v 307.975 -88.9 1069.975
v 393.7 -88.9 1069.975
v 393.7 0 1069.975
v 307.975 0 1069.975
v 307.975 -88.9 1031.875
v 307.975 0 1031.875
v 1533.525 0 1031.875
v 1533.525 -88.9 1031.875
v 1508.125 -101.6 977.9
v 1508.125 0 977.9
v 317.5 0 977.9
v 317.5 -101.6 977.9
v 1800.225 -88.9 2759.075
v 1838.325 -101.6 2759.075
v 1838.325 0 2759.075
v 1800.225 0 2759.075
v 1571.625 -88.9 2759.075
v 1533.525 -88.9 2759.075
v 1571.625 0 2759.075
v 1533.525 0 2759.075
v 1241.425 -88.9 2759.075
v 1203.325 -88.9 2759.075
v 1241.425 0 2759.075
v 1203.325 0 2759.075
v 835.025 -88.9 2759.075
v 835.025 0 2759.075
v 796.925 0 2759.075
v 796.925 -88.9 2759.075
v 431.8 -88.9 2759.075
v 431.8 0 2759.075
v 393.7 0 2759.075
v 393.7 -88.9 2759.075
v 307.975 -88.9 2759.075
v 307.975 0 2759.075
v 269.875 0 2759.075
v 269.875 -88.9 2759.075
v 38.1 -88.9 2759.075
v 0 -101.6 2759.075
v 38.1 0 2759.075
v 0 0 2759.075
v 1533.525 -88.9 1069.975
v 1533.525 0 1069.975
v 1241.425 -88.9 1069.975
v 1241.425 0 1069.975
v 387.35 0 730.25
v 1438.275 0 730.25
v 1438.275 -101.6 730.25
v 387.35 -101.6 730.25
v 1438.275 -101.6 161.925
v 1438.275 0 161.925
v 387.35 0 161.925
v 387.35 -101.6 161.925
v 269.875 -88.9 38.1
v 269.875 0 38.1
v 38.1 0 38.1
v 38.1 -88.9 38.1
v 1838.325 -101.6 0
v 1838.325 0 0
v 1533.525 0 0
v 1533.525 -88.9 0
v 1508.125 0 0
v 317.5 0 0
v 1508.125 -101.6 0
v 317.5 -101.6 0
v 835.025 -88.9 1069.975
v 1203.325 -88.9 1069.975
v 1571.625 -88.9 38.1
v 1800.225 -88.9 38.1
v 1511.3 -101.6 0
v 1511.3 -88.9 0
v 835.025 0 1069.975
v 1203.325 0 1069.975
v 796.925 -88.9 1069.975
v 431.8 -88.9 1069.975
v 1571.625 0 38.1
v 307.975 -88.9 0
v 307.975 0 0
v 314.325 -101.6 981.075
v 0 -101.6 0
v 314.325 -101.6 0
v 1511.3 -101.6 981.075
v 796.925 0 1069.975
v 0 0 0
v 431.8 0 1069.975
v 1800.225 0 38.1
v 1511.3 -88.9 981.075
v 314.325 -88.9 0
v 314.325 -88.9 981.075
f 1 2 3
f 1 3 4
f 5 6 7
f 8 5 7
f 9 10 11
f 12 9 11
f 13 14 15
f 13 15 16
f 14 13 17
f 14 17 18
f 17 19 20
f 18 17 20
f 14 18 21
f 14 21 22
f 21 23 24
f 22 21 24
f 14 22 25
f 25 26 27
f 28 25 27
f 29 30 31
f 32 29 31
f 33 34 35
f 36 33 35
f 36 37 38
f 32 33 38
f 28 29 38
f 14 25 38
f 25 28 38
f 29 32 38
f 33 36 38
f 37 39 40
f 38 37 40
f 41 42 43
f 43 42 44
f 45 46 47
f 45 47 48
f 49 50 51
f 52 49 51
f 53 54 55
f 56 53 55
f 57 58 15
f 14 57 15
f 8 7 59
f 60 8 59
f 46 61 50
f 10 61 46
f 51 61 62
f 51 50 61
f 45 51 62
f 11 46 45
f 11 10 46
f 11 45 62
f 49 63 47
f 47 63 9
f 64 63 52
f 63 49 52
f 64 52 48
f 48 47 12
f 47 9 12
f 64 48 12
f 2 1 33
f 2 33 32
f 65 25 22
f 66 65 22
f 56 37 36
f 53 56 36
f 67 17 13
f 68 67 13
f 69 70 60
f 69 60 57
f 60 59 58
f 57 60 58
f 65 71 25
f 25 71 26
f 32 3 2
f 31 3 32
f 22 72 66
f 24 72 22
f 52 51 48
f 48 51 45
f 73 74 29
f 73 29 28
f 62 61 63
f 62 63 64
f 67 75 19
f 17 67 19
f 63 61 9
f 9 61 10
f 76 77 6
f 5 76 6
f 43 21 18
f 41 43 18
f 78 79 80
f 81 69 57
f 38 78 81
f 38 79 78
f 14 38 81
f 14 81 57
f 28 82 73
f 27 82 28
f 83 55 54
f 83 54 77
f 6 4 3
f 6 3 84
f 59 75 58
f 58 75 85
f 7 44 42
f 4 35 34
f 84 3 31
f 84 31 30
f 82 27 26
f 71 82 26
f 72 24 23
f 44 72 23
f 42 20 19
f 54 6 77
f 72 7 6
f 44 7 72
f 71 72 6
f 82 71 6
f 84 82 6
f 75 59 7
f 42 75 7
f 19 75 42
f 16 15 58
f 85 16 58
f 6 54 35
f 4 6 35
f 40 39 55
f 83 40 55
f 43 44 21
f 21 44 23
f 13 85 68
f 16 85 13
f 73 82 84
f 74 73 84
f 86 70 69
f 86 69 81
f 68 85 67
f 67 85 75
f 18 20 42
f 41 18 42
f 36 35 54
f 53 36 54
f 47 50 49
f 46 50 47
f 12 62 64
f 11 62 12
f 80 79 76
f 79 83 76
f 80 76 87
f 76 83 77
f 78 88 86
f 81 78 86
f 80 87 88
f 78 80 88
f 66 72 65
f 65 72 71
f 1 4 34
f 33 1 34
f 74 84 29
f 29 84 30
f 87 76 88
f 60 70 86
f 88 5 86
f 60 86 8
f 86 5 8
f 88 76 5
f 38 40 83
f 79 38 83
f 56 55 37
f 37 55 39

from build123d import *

# Parameters (mm, degrees)
F0_W     = 38.1
F0_H     = 2720.975
F0_H_2   = 1689.1
F1_DEPTH = 88.9
F2_W     = 1190.625
F2_H     = 977.9
F2_W_2   = 1050.925
F2_H_2   = 568.325
F3_DEPTH = 101.6
F4_W     = 412.75
F4_H     = 914.4
F4_W_2   = 1425.575
F4_W_3   = 314.325
F4_H_2   = 981.075
F4_W_4   = 327.025
F5_DEPTH = 12.7


with BuildPart() as f1:
    # F0 (on Front) → F1 (new body)
    with BuildSketch(Plane.XZ):
        with Locations((19.05, 1398.5875)):
            Rectangle(F0_W, F0_H)
        Polygon((38.1, 38.1), (0, 38.1), (0, 0), (307.975, 0), (307.975, 38.1), (269.875, 38.1), align=None)
        Polygon((269.875, 2759.075), (269.875, 38.1), (307.975, 38.1), (307.975, 1031.875), (307.975, 1069.975), (307.975, 2759.075), align=None)
        Polygon((307.975, 1069.975), (307.975, 1031.875), (1533.525, 1031.875), (1533.525, 1069.975), (1241.425, 1069.975), (1203.325, 1069.975), (835.025, 1069.975), (796.925, 1069.975), (431.8, 1069.975), (393.7, 1069.975), align=None)
        Polygon((1533.525, 1069.975), (1533.525, 1031.875), (1533.525, 38.1), (1571.625, 38.1), (1571.625, 2759.075), (1533.525, 2759.075), align=None)
        Polygon((1571.625, 38.1), (1533.525, 38.1), (1533.525, 0), (1838.325, 0), (1838.325, 38.1), (1800.225, 38.1), align=None)
        with Locations((412.75, 1914.525)):
            Rectangle(F0_W, F0_H_2)
        with Locations((1222.375, 1914.525)):
            Rectangle(F0_W, F0_H_2)
        with Locations((1819.275, 1398.5875)):
            Rectangle(F0_W, F0_H)
        with Locations((815.975, 1914.525)):
            Rectangle(F0_W, F0_H_2)
    extrude(amount=F1_DEPTH)

    # F4 (on face) → F5 (join)
    with BuildSketch(Plane.XZ.offset(88.9)):
        with Locations((206.375, 2301.875)):
            Rectangle(F4_W, F4_H)
        with Locations((1125.5375, 2301.875)):
            Rectangle(F4_W_2, F4_H)
        Polygon((412.75, 1844.675), (0, 1844.675), (0, 981.075), (314.325, 981.075), (412.75, 981.075), align=None)
        Polygon((1838.325, 1844.675), (412.75, 1844.675), (412.75, 981.075), (1511.3, 981.075), (1838.325, 981.075), align=None)
        with Locations((157.1625, 490.5375)):
            Rectangle(F4_W_3, F4_H_2)
        with Locations((1674.8125, 490.5375)):
            Rectangle(F4_W_4, F4_H_2)
    extrude(amount=F5_DEPTH)


with BuildPart() as f3:
    # F2 (on face) → F3 (new body)
    with BuildSketch(Plane(origin=(0, 0, 0), x_dir=(-1, 0, 0), z_dir=(0, 1, 0))):
        with Locations((-912.8125, 488.95)):
            Rectangle(F2_W, F2_H)
        with Locations((-912.8125, 446.0875)):
            Rectangle(F2_W_2, F2_H_2, mode=Mode.SUBTRACT)
    extrude(amount=-F3_DEPTH)


solid = Compound([f1.part, f3.part])
